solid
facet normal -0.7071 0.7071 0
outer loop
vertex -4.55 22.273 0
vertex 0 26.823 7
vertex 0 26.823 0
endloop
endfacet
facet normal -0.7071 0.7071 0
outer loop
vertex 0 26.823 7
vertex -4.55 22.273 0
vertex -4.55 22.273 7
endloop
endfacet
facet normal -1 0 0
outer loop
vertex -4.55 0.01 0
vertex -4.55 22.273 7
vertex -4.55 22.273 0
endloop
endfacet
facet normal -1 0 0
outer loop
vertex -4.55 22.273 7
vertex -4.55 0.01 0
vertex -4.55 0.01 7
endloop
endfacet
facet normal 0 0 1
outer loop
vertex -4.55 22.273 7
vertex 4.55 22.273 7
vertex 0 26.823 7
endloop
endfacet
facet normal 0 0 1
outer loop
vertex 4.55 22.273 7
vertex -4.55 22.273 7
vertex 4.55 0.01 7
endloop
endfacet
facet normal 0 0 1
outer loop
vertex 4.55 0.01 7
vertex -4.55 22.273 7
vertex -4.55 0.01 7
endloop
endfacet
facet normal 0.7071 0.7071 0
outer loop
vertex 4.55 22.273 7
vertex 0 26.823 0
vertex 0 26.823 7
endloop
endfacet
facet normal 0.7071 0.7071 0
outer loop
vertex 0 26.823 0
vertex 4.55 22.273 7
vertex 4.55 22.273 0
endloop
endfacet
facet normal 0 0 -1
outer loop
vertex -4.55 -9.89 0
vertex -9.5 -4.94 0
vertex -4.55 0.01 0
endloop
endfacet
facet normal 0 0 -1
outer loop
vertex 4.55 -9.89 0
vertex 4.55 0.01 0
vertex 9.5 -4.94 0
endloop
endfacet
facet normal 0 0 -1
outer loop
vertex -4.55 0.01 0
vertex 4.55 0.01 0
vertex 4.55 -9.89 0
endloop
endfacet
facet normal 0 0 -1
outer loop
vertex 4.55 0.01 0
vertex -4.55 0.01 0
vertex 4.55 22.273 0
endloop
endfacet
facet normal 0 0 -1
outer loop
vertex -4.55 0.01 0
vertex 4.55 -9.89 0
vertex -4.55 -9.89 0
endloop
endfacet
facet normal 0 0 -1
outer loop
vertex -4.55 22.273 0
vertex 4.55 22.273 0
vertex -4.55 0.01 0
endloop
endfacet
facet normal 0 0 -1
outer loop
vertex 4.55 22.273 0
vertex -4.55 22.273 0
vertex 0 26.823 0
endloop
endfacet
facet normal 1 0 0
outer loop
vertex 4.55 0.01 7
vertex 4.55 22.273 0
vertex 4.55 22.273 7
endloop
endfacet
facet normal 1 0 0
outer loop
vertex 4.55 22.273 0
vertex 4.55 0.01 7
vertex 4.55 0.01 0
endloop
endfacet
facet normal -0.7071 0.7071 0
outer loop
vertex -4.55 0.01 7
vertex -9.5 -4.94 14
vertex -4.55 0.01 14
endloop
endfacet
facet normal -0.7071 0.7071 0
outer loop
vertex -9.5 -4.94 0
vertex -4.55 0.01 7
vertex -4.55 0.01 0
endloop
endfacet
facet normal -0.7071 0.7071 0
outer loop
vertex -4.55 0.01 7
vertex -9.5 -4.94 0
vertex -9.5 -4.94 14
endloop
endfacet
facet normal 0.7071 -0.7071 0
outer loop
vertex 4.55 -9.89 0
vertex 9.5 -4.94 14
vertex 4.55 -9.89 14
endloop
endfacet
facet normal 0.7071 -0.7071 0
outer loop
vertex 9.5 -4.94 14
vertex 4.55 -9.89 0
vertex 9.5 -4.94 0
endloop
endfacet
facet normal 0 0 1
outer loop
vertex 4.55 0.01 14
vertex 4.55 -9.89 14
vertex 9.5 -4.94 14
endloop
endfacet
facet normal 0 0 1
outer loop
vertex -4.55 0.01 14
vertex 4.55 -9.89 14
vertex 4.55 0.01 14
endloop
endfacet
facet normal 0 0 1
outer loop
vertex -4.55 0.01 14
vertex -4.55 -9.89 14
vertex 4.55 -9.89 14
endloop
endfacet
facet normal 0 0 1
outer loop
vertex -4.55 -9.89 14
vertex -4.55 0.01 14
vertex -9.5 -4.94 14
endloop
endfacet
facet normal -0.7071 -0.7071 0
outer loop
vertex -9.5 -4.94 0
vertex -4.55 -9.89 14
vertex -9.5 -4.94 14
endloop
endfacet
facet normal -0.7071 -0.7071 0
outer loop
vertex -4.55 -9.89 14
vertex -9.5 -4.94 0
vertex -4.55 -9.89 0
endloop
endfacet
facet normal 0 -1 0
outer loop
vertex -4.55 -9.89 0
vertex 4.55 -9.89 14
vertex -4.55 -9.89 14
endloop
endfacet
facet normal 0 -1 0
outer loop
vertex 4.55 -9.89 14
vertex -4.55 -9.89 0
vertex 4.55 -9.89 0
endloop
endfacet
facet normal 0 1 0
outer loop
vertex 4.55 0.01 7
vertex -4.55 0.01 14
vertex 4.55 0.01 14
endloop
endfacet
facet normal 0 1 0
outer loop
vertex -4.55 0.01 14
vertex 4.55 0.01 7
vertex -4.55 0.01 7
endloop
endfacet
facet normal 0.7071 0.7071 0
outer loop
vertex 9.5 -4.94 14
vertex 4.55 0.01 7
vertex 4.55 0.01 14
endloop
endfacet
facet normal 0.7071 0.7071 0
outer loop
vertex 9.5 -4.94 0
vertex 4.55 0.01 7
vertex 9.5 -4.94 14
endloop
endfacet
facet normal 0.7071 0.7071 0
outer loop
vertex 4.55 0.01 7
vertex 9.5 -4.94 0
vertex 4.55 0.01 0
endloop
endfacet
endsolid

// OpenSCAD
//Spacers for Wanhao Duplicator 4S
//Used to align the cover with the frame
//Ari M. Diacou
//January 2016
//Shared under Creative Commons License: Attribution-ShareAlike 3.0 Unported (CC BY-SA 3.0) 
//see http://creativecommons.org/licenses/by-sa/3.0/

inch=25.4+0;//In case you want to specify distances in inches (1"=25.4mm).
//The hole these will fit into is roughly hexagonal. Measure the widest corner to corner distance.
widest_corner_to_corner_distance=19.3;
//Measure the distance between the corners in a direction outward from the top-center of the printer. This direction should be perpendicular to the one just measured.
corner_to_corner_distance_in_outward_direction=10;
//Measure the depth/height of the curled over part of the top frame. 
base_depth=7;
//How high would you like your spacer to rise off the frame?
tip_height=7;
//What is the left-right distance of the gap between the frame angle bars?
frame_width=366.7;
//What is the distance of the gap between the frame angle bars, in the front to back direction? 
frame_depth=219.1;
//What is the inside left-right distance of your cover?
cover_width=412.8;
//What is the inside front-back distance of your cover?
cover_depth=266.7;
//A tolerance distance that makes the dimensions smaller by relative but appropriate? amounts. 1 = 1mm shaved off the widest corner to corner distance, .5mm in the corner to corner distance in outward direction, and would give a 3mm tolerance in the width, and 2mm in the depth directions.
tolerance=.2;
/*[Hidden]*/
///////////////// Derived Parameters ////////////////////////
b=corner_to_corner_distance_in_outward_direction-tolerance/2; 
a=(min(cover_width-frame_width-3*tolerance,cover_depth-frame_depth-2*tolerance)-sqrt(2)*b)*sqrt(2)/2; 
c=widest_corner_to_corner_distance-corner_to_corner_distance_in_outward_direction-tolerance; 
A=[0,a+c/2];
B=[c/2,a];I=left(B);
C=[c/2,0];H=left(C);
D=[c/2+b/2,-b/2];G=left(D);
E=[c/2,-b];F=left(E);
TIP=[A,B,C,H,I];
BASE=[C,D,E,F,G,H];
/////////////////// Testing Output //////////////////////////
echo(str("cover width-frame width(x)=",cover_width-frame_width," mm"));
echo(str("cover depth-frame depth(y)=",cover_depth-frame_depth ," mm"));
echo(str("a=",a," mm"));
echo(str("b=",b," mm"));
echo(str("c=",c," mm"));
echo(str("tip length=",A[1]," mm"));
echo(str("total length=",A[1]+b," mm"));
echo(str("total width=",D[0]*2," mm"));
echo(str("total height=",tip_height+base_depth," mm"));
echo(str("suggested filename = spacer a=",a,",b=",b,",c=",c,",z=",tip_height));
/////////////////////// Main() //////////////////////////////
color("red") linear_extrude(tip_height) polygon(TIP);
translate([0,.01,0]) color("brown") linear_extrude(tip_height+base_depth) polygon(BASE);
//////////////////// Functions //////////////////////////////
function left(RIGHT)=[-RIGHT[0],RIGHT[1]];
